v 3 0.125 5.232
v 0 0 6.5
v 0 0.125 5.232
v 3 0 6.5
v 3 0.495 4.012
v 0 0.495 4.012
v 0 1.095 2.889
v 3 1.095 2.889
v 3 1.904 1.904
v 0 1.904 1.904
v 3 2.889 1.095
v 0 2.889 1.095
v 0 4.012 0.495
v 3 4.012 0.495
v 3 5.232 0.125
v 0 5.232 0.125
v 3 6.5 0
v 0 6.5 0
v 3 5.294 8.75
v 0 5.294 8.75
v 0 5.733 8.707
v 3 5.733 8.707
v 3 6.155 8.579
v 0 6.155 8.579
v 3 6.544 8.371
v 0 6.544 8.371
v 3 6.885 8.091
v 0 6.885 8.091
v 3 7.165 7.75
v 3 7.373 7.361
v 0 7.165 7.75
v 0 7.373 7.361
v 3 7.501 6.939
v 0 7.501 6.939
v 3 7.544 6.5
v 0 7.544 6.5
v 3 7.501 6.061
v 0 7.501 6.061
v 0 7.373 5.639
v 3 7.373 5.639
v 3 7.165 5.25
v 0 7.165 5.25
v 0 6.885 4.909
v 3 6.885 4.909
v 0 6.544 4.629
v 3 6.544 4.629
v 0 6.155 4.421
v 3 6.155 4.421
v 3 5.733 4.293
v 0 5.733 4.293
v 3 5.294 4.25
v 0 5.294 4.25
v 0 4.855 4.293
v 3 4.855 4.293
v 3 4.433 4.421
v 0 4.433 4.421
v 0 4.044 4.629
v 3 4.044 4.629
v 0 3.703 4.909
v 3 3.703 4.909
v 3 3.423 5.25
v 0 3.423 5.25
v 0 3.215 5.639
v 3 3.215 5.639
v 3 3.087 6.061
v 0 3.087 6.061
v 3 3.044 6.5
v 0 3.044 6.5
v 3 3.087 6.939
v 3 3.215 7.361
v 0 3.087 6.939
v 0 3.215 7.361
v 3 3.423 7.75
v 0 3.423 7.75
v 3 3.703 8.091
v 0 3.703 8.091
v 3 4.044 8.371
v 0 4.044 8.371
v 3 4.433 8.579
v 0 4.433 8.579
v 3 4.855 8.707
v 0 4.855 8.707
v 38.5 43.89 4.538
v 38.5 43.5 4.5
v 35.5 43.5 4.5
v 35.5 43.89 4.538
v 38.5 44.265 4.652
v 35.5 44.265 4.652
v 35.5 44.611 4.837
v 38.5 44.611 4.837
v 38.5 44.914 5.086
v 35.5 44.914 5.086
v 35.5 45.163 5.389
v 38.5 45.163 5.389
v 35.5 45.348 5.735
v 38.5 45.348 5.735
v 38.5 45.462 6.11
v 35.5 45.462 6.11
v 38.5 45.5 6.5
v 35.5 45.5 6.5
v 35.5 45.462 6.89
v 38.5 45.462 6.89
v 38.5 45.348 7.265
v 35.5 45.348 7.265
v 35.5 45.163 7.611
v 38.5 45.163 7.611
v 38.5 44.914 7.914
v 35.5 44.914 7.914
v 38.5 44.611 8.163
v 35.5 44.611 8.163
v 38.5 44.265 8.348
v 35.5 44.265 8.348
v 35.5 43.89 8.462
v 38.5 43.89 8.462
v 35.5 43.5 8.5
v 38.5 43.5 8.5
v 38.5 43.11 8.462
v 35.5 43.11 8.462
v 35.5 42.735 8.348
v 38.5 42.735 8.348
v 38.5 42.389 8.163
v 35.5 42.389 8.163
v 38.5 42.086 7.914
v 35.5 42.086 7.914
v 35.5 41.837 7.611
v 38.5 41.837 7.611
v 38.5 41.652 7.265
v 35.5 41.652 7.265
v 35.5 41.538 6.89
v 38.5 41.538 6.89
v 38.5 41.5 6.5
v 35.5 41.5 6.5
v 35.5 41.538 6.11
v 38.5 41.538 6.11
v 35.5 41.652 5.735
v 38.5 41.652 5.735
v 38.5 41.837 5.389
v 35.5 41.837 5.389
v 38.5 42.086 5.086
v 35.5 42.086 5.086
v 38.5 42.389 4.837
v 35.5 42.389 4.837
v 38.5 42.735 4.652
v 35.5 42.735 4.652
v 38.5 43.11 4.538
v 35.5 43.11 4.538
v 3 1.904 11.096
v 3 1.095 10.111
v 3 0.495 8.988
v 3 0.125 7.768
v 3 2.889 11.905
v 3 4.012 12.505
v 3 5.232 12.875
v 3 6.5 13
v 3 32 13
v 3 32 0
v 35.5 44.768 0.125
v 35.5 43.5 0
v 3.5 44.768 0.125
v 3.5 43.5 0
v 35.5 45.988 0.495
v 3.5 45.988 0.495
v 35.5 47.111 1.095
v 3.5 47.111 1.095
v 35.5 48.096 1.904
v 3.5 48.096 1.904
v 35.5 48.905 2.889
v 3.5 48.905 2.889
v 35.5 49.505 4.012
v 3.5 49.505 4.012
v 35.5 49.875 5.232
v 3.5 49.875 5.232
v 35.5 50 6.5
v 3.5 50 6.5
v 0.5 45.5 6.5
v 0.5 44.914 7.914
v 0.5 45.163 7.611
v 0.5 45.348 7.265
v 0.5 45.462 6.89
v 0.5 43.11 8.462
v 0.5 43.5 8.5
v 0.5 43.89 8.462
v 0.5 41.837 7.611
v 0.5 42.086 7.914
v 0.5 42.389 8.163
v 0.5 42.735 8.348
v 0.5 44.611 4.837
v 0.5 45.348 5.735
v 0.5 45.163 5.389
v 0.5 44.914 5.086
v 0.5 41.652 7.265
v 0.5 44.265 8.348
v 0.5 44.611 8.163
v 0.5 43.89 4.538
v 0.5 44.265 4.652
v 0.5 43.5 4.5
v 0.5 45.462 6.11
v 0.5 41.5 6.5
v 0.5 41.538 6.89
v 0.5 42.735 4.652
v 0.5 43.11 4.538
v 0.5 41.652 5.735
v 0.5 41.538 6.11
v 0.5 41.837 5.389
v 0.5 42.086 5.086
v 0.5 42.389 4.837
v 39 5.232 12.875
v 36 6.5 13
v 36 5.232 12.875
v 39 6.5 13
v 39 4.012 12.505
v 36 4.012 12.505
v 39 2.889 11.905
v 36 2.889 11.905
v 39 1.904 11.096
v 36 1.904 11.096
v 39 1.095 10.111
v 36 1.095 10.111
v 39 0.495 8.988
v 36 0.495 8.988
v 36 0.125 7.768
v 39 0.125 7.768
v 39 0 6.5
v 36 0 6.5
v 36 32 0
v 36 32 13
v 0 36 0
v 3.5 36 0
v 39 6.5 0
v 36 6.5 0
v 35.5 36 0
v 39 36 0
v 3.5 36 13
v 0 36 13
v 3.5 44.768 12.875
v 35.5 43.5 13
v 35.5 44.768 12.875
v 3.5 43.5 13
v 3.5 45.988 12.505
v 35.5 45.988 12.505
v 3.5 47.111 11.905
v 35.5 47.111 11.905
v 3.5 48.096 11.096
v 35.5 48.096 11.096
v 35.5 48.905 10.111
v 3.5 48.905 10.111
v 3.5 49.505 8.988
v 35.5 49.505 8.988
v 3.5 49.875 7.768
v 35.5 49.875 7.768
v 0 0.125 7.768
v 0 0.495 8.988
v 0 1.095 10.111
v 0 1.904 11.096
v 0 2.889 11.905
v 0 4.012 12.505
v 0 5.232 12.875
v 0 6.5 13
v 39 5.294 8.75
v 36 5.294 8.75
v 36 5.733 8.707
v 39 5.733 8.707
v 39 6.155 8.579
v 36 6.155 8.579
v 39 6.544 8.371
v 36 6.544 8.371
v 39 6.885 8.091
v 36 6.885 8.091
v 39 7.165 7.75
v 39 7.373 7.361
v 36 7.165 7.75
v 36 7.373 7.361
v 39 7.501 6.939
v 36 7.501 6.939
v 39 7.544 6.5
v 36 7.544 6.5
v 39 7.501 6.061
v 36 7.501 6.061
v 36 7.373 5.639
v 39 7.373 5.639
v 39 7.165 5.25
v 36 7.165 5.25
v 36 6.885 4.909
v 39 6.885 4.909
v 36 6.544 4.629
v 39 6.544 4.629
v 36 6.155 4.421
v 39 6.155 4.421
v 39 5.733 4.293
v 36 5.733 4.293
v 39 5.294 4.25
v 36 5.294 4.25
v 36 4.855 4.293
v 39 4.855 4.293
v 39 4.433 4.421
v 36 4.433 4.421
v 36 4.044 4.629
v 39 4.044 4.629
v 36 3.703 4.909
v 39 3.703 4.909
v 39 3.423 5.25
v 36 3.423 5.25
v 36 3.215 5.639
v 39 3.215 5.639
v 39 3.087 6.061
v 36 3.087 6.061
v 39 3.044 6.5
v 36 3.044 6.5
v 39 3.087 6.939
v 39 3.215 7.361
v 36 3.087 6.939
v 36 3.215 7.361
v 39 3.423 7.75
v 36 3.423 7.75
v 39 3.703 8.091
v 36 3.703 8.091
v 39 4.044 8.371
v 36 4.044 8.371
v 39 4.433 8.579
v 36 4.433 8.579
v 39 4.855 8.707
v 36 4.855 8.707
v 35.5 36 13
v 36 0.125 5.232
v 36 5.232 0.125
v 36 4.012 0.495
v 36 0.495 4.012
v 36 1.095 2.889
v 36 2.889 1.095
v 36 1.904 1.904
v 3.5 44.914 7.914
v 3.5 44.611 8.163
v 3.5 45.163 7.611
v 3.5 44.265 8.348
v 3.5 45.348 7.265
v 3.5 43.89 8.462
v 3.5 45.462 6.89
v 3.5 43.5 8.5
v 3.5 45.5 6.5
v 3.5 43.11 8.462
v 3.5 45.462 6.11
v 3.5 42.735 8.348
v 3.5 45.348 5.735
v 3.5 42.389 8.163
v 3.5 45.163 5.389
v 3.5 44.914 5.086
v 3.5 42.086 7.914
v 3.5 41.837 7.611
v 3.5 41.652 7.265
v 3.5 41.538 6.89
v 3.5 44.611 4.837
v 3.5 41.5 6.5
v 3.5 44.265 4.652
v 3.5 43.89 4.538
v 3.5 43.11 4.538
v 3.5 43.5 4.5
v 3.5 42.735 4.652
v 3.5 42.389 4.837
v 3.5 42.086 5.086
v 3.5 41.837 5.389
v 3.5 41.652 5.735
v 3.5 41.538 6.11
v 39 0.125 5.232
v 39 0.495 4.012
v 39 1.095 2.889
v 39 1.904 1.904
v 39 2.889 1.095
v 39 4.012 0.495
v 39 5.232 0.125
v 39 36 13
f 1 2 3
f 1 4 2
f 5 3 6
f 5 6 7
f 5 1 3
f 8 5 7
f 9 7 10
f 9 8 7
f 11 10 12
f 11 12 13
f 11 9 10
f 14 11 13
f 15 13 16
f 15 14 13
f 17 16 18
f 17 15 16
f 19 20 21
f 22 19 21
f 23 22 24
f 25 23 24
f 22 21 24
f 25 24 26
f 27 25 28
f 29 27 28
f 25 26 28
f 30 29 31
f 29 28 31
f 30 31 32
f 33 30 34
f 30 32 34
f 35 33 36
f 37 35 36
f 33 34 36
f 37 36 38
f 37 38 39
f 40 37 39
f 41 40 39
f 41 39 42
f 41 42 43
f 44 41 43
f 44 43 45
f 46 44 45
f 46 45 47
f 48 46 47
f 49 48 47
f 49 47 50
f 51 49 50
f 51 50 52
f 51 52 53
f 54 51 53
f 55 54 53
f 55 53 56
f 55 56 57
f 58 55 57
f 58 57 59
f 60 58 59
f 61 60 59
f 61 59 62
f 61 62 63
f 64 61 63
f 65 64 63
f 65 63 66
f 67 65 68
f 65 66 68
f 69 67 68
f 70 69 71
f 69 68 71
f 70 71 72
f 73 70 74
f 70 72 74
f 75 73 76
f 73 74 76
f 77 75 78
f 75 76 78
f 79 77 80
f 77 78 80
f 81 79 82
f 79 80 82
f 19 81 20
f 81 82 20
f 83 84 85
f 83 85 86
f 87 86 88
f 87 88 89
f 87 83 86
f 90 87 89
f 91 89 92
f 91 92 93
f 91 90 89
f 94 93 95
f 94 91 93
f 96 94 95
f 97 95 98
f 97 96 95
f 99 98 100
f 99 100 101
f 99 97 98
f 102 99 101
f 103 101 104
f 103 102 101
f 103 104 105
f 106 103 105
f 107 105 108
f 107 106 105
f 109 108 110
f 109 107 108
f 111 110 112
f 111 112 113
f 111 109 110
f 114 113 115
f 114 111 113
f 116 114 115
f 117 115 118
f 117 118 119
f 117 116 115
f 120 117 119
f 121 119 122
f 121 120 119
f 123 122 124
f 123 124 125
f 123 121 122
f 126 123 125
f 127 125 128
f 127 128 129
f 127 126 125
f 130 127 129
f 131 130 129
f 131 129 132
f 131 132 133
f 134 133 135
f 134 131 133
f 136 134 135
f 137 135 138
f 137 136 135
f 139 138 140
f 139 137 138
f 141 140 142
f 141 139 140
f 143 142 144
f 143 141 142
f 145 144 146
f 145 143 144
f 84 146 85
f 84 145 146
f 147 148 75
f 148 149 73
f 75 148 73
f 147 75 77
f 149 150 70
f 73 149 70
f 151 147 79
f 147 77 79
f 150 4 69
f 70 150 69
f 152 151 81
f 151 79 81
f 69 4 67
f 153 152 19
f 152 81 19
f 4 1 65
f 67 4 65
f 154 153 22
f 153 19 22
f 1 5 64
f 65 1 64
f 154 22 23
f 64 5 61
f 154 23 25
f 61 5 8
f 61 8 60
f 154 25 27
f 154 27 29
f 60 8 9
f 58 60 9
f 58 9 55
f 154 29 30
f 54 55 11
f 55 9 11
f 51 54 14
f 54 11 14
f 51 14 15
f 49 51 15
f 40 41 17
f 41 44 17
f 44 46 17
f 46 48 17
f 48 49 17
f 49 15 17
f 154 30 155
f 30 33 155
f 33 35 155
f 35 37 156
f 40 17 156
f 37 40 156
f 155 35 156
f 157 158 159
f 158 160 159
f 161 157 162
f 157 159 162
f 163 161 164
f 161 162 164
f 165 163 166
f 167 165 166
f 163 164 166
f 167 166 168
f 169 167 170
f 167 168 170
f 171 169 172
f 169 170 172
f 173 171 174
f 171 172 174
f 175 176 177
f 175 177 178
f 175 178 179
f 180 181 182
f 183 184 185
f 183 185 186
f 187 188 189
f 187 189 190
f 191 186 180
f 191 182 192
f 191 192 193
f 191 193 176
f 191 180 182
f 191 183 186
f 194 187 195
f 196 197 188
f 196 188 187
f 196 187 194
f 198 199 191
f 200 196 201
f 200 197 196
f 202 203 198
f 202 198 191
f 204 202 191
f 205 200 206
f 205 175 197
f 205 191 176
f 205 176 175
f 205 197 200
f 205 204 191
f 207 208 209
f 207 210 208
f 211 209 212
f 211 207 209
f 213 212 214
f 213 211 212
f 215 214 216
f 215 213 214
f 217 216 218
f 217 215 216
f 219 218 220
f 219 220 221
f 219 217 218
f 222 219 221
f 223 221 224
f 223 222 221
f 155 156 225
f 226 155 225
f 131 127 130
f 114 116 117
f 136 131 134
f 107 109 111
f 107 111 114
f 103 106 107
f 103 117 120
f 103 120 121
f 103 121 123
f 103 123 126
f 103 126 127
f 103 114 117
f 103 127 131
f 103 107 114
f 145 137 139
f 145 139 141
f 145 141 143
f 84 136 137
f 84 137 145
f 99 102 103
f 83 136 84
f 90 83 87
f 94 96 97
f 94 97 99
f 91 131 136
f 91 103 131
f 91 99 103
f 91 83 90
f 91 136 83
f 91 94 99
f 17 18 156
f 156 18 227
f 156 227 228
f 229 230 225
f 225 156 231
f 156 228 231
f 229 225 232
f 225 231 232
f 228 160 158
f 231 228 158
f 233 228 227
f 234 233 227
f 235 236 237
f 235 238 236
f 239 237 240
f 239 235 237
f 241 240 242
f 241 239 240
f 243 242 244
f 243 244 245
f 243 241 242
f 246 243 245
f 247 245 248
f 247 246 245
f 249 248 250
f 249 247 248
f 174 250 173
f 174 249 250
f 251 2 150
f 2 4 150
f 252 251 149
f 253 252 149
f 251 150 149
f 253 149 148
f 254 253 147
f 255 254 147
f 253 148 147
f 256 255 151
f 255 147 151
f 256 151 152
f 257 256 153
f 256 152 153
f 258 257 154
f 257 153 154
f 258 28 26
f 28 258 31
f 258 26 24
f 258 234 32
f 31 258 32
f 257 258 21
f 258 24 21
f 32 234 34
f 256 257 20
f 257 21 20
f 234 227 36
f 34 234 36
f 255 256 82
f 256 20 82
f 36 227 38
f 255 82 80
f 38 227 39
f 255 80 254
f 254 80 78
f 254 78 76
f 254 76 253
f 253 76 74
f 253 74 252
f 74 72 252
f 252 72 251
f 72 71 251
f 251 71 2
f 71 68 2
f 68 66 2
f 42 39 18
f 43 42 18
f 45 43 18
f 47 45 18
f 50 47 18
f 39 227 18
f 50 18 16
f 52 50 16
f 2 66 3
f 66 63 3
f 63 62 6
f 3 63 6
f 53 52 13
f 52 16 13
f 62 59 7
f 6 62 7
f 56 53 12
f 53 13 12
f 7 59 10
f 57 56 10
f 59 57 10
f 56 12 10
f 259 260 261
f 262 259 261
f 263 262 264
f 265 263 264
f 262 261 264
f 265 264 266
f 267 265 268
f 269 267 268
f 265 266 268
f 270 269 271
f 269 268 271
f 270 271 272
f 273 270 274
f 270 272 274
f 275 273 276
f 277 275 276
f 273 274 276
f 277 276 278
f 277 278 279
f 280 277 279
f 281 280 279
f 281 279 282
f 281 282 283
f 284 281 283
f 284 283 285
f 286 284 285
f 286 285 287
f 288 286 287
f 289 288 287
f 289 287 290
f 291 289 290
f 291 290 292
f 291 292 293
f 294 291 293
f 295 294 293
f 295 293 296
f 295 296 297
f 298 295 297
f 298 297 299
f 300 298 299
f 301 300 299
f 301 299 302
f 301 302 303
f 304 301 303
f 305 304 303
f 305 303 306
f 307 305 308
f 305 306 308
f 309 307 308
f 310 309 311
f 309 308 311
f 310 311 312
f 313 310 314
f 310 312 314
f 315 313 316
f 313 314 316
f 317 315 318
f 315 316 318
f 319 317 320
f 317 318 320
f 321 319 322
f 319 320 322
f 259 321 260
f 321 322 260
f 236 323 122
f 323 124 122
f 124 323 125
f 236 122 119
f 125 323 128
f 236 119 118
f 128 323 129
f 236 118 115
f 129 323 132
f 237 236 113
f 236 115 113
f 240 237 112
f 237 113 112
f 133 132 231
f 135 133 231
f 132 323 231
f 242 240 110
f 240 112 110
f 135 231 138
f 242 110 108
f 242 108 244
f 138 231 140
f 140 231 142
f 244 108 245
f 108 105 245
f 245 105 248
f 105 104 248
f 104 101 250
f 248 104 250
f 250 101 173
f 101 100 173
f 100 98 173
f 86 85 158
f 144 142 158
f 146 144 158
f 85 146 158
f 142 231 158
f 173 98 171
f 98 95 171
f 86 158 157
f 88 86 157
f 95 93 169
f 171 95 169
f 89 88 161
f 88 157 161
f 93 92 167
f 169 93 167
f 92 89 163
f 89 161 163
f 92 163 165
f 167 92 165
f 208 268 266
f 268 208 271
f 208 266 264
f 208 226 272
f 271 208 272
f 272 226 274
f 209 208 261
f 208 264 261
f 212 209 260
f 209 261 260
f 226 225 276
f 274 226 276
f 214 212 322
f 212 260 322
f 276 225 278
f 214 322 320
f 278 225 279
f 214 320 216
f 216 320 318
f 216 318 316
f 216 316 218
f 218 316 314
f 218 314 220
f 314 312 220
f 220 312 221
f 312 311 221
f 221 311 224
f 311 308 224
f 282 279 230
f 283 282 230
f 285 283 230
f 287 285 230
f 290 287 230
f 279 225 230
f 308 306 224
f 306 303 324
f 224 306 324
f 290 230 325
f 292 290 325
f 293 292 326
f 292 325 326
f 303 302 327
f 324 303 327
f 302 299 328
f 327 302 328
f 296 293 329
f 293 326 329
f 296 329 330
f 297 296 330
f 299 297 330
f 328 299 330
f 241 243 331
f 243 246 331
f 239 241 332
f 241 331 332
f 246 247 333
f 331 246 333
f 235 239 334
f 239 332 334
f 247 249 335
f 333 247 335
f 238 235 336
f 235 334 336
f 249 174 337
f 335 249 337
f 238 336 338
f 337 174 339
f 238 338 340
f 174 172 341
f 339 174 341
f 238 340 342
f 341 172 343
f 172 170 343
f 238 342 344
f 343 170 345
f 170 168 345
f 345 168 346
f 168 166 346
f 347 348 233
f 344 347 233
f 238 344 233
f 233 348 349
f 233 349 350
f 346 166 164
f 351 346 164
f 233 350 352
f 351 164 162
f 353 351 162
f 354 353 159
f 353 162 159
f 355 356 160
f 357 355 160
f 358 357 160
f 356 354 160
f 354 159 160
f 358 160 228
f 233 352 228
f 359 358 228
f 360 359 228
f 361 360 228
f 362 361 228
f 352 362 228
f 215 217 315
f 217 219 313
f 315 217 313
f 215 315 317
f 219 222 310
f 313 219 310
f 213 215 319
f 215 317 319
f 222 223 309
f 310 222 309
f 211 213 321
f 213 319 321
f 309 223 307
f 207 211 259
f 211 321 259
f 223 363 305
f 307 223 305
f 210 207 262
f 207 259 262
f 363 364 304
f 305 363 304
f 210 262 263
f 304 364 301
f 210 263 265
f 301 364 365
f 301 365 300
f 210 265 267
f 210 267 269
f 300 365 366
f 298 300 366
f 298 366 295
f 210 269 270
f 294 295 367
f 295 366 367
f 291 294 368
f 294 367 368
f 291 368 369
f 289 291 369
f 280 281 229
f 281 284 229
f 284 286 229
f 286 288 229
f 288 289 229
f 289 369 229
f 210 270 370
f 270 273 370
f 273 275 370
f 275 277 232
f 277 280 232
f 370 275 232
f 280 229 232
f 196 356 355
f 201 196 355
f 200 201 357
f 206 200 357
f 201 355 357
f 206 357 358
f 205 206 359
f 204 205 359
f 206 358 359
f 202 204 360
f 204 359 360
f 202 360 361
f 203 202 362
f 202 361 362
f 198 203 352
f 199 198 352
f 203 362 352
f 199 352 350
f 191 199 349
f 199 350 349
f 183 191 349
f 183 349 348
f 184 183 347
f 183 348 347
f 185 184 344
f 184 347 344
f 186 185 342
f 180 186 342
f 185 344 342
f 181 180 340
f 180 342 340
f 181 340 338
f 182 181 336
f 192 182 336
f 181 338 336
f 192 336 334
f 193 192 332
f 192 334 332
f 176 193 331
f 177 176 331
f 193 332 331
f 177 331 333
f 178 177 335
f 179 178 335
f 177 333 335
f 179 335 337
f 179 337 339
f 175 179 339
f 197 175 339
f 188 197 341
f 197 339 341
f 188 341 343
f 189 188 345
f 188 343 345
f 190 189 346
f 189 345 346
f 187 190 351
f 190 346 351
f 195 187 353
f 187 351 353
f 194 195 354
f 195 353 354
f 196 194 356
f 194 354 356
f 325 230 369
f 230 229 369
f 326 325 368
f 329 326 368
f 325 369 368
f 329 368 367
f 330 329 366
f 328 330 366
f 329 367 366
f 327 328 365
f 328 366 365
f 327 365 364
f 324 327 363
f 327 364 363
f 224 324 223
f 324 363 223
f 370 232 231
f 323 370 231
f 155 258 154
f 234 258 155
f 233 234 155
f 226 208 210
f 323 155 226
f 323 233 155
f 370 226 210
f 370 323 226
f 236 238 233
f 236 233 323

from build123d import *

# Parameters (mm, degrees)
BOSS_EXTRUDE1_DEPTH = 13
SKETCH2_R           = 2.25
CUT_EXTRUDE1_DEPTH  = 65.730209331
SKETCH3_R           = 2
BOSS_EXTRUDE2_DEPTH = 3
BOSS_EXTRUDE3_START = 3
SKETCH4_R           = 2
BOSS_EXTRUDE3_DEPTH = 3
FILLET1_R           = 6.5
FILLET2_R           = 6.5


with BuildPart() as part:
    # Sketch1 → Boss-Extrude1 (new body)
    with BuildSketch(Plane.XY):
        Polygon((3, 0), (3, 32), (36, 32), (36, 0), (39, 0), (39, 36), (35.5, 36), (35.5, 50), (3.5, 50), (3.5, 36), (0, 36), (0, 0), align=None)
    extrude(amount=BOSS_EXTRUDE1_DEPTH)

    # Sketch2 → Cut-Extrude1 (cut, through all)
    with BuildSketch(Plane.ZY):
        with Locations((6.5, 5.293988539)):
            Circle(SKETCH2_R)
    extrude(amount=-CUT_EXTRUDE1_DEPTH, mode=Mode.SUBTRACT)

    # Sketch3 → Boss-Extrude2 (add)
    with BuildSketch(Plane.ZY.offset(-3.5)):
        with Locations(Location((6.5, 43.5, 0), (0, 0, 180))):
            Circle(SKETCH3_R)
    extrude(amount=BOSS_EXTRUDE2_DEPTH)

    # Sketch4 → Boss-Extrude3 (add)
    with BuildSketch(Plane(origin=(35.5, 0, 0), x_dir=(0, 0, -1), z_dir=(1, 0, 0)).offset(BOSS_EXTRUDE3_START)):
        with Locations((-6.5, 43.5)):
            Circle(SKETCH4_R)
    extrude(amount=-BOSS_EXTRUDE3_DEPTH)

    # Fillet1
    fillet1_edges = [part.edges().sort_by_distance(p)[0] for p in [
        (1.5, 0, 0),
        (1.5, 0, 13),
        (37.5, 0, 0),
        (37.5, 0, 13),
    ]]
    fillet(fillet1_edges, radius=FILLET1_R - 0.0001)  # a hair under: the kernel refuses the full size

    # Fillet2
    fillet2_edges = [part.edges().sort_by_distance(p)[0] for p in [
        (19.5, 50, 13),
        (19.5, 50, 0),
    ]]
    fillet(fillet2_edges, radius=FILLET2_R - 0.0001)  # a hair under: the kernel refuses the full size


solid = part.part
